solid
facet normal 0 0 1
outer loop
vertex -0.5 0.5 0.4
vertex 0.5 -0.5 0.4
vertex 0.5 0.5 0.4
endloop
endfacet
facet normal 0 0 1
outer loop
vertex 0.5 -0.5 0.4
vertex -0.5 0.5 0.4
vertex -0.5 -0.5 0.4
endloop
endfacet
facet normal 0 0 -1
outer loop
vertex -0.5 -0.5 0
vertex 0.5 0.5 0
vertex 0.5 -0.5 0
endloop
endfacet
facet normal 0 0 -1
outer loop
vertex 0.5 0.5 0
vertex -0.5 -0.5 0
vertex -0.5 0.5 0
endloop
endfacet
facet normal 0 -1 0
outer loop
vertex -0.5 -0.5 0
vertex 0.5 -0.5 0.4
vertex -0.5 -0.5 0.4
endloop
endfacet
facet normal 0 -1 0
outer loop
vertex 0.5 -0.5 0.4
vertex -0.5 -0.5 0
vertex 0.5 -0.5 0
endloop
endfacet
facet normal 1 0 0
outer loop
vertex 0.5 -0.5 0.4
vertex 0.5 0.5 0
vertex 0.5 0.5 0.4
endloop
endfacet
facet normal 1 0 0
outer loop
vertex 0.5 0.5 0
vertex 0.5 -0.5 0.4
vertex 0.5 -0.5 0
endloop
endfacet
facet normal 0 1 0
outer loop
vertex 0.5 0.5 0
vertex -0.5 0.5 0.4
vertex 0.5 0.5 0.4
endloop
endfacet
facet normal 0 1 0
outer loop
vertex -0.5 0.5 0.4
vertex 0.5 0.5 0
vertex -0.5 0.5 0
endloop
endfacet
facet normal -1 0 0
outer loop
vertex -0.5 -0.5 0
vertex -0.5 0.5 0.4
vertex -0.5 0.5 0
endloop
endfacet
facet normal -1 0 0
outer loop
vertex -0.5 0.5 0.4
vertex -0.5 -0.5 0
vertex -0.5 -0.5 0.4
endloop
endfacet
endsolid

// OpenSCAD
color ("black") {
    translate([-0.5,-0.5,0]) {        
        cube( [1,1,0.4] );
    }
}
